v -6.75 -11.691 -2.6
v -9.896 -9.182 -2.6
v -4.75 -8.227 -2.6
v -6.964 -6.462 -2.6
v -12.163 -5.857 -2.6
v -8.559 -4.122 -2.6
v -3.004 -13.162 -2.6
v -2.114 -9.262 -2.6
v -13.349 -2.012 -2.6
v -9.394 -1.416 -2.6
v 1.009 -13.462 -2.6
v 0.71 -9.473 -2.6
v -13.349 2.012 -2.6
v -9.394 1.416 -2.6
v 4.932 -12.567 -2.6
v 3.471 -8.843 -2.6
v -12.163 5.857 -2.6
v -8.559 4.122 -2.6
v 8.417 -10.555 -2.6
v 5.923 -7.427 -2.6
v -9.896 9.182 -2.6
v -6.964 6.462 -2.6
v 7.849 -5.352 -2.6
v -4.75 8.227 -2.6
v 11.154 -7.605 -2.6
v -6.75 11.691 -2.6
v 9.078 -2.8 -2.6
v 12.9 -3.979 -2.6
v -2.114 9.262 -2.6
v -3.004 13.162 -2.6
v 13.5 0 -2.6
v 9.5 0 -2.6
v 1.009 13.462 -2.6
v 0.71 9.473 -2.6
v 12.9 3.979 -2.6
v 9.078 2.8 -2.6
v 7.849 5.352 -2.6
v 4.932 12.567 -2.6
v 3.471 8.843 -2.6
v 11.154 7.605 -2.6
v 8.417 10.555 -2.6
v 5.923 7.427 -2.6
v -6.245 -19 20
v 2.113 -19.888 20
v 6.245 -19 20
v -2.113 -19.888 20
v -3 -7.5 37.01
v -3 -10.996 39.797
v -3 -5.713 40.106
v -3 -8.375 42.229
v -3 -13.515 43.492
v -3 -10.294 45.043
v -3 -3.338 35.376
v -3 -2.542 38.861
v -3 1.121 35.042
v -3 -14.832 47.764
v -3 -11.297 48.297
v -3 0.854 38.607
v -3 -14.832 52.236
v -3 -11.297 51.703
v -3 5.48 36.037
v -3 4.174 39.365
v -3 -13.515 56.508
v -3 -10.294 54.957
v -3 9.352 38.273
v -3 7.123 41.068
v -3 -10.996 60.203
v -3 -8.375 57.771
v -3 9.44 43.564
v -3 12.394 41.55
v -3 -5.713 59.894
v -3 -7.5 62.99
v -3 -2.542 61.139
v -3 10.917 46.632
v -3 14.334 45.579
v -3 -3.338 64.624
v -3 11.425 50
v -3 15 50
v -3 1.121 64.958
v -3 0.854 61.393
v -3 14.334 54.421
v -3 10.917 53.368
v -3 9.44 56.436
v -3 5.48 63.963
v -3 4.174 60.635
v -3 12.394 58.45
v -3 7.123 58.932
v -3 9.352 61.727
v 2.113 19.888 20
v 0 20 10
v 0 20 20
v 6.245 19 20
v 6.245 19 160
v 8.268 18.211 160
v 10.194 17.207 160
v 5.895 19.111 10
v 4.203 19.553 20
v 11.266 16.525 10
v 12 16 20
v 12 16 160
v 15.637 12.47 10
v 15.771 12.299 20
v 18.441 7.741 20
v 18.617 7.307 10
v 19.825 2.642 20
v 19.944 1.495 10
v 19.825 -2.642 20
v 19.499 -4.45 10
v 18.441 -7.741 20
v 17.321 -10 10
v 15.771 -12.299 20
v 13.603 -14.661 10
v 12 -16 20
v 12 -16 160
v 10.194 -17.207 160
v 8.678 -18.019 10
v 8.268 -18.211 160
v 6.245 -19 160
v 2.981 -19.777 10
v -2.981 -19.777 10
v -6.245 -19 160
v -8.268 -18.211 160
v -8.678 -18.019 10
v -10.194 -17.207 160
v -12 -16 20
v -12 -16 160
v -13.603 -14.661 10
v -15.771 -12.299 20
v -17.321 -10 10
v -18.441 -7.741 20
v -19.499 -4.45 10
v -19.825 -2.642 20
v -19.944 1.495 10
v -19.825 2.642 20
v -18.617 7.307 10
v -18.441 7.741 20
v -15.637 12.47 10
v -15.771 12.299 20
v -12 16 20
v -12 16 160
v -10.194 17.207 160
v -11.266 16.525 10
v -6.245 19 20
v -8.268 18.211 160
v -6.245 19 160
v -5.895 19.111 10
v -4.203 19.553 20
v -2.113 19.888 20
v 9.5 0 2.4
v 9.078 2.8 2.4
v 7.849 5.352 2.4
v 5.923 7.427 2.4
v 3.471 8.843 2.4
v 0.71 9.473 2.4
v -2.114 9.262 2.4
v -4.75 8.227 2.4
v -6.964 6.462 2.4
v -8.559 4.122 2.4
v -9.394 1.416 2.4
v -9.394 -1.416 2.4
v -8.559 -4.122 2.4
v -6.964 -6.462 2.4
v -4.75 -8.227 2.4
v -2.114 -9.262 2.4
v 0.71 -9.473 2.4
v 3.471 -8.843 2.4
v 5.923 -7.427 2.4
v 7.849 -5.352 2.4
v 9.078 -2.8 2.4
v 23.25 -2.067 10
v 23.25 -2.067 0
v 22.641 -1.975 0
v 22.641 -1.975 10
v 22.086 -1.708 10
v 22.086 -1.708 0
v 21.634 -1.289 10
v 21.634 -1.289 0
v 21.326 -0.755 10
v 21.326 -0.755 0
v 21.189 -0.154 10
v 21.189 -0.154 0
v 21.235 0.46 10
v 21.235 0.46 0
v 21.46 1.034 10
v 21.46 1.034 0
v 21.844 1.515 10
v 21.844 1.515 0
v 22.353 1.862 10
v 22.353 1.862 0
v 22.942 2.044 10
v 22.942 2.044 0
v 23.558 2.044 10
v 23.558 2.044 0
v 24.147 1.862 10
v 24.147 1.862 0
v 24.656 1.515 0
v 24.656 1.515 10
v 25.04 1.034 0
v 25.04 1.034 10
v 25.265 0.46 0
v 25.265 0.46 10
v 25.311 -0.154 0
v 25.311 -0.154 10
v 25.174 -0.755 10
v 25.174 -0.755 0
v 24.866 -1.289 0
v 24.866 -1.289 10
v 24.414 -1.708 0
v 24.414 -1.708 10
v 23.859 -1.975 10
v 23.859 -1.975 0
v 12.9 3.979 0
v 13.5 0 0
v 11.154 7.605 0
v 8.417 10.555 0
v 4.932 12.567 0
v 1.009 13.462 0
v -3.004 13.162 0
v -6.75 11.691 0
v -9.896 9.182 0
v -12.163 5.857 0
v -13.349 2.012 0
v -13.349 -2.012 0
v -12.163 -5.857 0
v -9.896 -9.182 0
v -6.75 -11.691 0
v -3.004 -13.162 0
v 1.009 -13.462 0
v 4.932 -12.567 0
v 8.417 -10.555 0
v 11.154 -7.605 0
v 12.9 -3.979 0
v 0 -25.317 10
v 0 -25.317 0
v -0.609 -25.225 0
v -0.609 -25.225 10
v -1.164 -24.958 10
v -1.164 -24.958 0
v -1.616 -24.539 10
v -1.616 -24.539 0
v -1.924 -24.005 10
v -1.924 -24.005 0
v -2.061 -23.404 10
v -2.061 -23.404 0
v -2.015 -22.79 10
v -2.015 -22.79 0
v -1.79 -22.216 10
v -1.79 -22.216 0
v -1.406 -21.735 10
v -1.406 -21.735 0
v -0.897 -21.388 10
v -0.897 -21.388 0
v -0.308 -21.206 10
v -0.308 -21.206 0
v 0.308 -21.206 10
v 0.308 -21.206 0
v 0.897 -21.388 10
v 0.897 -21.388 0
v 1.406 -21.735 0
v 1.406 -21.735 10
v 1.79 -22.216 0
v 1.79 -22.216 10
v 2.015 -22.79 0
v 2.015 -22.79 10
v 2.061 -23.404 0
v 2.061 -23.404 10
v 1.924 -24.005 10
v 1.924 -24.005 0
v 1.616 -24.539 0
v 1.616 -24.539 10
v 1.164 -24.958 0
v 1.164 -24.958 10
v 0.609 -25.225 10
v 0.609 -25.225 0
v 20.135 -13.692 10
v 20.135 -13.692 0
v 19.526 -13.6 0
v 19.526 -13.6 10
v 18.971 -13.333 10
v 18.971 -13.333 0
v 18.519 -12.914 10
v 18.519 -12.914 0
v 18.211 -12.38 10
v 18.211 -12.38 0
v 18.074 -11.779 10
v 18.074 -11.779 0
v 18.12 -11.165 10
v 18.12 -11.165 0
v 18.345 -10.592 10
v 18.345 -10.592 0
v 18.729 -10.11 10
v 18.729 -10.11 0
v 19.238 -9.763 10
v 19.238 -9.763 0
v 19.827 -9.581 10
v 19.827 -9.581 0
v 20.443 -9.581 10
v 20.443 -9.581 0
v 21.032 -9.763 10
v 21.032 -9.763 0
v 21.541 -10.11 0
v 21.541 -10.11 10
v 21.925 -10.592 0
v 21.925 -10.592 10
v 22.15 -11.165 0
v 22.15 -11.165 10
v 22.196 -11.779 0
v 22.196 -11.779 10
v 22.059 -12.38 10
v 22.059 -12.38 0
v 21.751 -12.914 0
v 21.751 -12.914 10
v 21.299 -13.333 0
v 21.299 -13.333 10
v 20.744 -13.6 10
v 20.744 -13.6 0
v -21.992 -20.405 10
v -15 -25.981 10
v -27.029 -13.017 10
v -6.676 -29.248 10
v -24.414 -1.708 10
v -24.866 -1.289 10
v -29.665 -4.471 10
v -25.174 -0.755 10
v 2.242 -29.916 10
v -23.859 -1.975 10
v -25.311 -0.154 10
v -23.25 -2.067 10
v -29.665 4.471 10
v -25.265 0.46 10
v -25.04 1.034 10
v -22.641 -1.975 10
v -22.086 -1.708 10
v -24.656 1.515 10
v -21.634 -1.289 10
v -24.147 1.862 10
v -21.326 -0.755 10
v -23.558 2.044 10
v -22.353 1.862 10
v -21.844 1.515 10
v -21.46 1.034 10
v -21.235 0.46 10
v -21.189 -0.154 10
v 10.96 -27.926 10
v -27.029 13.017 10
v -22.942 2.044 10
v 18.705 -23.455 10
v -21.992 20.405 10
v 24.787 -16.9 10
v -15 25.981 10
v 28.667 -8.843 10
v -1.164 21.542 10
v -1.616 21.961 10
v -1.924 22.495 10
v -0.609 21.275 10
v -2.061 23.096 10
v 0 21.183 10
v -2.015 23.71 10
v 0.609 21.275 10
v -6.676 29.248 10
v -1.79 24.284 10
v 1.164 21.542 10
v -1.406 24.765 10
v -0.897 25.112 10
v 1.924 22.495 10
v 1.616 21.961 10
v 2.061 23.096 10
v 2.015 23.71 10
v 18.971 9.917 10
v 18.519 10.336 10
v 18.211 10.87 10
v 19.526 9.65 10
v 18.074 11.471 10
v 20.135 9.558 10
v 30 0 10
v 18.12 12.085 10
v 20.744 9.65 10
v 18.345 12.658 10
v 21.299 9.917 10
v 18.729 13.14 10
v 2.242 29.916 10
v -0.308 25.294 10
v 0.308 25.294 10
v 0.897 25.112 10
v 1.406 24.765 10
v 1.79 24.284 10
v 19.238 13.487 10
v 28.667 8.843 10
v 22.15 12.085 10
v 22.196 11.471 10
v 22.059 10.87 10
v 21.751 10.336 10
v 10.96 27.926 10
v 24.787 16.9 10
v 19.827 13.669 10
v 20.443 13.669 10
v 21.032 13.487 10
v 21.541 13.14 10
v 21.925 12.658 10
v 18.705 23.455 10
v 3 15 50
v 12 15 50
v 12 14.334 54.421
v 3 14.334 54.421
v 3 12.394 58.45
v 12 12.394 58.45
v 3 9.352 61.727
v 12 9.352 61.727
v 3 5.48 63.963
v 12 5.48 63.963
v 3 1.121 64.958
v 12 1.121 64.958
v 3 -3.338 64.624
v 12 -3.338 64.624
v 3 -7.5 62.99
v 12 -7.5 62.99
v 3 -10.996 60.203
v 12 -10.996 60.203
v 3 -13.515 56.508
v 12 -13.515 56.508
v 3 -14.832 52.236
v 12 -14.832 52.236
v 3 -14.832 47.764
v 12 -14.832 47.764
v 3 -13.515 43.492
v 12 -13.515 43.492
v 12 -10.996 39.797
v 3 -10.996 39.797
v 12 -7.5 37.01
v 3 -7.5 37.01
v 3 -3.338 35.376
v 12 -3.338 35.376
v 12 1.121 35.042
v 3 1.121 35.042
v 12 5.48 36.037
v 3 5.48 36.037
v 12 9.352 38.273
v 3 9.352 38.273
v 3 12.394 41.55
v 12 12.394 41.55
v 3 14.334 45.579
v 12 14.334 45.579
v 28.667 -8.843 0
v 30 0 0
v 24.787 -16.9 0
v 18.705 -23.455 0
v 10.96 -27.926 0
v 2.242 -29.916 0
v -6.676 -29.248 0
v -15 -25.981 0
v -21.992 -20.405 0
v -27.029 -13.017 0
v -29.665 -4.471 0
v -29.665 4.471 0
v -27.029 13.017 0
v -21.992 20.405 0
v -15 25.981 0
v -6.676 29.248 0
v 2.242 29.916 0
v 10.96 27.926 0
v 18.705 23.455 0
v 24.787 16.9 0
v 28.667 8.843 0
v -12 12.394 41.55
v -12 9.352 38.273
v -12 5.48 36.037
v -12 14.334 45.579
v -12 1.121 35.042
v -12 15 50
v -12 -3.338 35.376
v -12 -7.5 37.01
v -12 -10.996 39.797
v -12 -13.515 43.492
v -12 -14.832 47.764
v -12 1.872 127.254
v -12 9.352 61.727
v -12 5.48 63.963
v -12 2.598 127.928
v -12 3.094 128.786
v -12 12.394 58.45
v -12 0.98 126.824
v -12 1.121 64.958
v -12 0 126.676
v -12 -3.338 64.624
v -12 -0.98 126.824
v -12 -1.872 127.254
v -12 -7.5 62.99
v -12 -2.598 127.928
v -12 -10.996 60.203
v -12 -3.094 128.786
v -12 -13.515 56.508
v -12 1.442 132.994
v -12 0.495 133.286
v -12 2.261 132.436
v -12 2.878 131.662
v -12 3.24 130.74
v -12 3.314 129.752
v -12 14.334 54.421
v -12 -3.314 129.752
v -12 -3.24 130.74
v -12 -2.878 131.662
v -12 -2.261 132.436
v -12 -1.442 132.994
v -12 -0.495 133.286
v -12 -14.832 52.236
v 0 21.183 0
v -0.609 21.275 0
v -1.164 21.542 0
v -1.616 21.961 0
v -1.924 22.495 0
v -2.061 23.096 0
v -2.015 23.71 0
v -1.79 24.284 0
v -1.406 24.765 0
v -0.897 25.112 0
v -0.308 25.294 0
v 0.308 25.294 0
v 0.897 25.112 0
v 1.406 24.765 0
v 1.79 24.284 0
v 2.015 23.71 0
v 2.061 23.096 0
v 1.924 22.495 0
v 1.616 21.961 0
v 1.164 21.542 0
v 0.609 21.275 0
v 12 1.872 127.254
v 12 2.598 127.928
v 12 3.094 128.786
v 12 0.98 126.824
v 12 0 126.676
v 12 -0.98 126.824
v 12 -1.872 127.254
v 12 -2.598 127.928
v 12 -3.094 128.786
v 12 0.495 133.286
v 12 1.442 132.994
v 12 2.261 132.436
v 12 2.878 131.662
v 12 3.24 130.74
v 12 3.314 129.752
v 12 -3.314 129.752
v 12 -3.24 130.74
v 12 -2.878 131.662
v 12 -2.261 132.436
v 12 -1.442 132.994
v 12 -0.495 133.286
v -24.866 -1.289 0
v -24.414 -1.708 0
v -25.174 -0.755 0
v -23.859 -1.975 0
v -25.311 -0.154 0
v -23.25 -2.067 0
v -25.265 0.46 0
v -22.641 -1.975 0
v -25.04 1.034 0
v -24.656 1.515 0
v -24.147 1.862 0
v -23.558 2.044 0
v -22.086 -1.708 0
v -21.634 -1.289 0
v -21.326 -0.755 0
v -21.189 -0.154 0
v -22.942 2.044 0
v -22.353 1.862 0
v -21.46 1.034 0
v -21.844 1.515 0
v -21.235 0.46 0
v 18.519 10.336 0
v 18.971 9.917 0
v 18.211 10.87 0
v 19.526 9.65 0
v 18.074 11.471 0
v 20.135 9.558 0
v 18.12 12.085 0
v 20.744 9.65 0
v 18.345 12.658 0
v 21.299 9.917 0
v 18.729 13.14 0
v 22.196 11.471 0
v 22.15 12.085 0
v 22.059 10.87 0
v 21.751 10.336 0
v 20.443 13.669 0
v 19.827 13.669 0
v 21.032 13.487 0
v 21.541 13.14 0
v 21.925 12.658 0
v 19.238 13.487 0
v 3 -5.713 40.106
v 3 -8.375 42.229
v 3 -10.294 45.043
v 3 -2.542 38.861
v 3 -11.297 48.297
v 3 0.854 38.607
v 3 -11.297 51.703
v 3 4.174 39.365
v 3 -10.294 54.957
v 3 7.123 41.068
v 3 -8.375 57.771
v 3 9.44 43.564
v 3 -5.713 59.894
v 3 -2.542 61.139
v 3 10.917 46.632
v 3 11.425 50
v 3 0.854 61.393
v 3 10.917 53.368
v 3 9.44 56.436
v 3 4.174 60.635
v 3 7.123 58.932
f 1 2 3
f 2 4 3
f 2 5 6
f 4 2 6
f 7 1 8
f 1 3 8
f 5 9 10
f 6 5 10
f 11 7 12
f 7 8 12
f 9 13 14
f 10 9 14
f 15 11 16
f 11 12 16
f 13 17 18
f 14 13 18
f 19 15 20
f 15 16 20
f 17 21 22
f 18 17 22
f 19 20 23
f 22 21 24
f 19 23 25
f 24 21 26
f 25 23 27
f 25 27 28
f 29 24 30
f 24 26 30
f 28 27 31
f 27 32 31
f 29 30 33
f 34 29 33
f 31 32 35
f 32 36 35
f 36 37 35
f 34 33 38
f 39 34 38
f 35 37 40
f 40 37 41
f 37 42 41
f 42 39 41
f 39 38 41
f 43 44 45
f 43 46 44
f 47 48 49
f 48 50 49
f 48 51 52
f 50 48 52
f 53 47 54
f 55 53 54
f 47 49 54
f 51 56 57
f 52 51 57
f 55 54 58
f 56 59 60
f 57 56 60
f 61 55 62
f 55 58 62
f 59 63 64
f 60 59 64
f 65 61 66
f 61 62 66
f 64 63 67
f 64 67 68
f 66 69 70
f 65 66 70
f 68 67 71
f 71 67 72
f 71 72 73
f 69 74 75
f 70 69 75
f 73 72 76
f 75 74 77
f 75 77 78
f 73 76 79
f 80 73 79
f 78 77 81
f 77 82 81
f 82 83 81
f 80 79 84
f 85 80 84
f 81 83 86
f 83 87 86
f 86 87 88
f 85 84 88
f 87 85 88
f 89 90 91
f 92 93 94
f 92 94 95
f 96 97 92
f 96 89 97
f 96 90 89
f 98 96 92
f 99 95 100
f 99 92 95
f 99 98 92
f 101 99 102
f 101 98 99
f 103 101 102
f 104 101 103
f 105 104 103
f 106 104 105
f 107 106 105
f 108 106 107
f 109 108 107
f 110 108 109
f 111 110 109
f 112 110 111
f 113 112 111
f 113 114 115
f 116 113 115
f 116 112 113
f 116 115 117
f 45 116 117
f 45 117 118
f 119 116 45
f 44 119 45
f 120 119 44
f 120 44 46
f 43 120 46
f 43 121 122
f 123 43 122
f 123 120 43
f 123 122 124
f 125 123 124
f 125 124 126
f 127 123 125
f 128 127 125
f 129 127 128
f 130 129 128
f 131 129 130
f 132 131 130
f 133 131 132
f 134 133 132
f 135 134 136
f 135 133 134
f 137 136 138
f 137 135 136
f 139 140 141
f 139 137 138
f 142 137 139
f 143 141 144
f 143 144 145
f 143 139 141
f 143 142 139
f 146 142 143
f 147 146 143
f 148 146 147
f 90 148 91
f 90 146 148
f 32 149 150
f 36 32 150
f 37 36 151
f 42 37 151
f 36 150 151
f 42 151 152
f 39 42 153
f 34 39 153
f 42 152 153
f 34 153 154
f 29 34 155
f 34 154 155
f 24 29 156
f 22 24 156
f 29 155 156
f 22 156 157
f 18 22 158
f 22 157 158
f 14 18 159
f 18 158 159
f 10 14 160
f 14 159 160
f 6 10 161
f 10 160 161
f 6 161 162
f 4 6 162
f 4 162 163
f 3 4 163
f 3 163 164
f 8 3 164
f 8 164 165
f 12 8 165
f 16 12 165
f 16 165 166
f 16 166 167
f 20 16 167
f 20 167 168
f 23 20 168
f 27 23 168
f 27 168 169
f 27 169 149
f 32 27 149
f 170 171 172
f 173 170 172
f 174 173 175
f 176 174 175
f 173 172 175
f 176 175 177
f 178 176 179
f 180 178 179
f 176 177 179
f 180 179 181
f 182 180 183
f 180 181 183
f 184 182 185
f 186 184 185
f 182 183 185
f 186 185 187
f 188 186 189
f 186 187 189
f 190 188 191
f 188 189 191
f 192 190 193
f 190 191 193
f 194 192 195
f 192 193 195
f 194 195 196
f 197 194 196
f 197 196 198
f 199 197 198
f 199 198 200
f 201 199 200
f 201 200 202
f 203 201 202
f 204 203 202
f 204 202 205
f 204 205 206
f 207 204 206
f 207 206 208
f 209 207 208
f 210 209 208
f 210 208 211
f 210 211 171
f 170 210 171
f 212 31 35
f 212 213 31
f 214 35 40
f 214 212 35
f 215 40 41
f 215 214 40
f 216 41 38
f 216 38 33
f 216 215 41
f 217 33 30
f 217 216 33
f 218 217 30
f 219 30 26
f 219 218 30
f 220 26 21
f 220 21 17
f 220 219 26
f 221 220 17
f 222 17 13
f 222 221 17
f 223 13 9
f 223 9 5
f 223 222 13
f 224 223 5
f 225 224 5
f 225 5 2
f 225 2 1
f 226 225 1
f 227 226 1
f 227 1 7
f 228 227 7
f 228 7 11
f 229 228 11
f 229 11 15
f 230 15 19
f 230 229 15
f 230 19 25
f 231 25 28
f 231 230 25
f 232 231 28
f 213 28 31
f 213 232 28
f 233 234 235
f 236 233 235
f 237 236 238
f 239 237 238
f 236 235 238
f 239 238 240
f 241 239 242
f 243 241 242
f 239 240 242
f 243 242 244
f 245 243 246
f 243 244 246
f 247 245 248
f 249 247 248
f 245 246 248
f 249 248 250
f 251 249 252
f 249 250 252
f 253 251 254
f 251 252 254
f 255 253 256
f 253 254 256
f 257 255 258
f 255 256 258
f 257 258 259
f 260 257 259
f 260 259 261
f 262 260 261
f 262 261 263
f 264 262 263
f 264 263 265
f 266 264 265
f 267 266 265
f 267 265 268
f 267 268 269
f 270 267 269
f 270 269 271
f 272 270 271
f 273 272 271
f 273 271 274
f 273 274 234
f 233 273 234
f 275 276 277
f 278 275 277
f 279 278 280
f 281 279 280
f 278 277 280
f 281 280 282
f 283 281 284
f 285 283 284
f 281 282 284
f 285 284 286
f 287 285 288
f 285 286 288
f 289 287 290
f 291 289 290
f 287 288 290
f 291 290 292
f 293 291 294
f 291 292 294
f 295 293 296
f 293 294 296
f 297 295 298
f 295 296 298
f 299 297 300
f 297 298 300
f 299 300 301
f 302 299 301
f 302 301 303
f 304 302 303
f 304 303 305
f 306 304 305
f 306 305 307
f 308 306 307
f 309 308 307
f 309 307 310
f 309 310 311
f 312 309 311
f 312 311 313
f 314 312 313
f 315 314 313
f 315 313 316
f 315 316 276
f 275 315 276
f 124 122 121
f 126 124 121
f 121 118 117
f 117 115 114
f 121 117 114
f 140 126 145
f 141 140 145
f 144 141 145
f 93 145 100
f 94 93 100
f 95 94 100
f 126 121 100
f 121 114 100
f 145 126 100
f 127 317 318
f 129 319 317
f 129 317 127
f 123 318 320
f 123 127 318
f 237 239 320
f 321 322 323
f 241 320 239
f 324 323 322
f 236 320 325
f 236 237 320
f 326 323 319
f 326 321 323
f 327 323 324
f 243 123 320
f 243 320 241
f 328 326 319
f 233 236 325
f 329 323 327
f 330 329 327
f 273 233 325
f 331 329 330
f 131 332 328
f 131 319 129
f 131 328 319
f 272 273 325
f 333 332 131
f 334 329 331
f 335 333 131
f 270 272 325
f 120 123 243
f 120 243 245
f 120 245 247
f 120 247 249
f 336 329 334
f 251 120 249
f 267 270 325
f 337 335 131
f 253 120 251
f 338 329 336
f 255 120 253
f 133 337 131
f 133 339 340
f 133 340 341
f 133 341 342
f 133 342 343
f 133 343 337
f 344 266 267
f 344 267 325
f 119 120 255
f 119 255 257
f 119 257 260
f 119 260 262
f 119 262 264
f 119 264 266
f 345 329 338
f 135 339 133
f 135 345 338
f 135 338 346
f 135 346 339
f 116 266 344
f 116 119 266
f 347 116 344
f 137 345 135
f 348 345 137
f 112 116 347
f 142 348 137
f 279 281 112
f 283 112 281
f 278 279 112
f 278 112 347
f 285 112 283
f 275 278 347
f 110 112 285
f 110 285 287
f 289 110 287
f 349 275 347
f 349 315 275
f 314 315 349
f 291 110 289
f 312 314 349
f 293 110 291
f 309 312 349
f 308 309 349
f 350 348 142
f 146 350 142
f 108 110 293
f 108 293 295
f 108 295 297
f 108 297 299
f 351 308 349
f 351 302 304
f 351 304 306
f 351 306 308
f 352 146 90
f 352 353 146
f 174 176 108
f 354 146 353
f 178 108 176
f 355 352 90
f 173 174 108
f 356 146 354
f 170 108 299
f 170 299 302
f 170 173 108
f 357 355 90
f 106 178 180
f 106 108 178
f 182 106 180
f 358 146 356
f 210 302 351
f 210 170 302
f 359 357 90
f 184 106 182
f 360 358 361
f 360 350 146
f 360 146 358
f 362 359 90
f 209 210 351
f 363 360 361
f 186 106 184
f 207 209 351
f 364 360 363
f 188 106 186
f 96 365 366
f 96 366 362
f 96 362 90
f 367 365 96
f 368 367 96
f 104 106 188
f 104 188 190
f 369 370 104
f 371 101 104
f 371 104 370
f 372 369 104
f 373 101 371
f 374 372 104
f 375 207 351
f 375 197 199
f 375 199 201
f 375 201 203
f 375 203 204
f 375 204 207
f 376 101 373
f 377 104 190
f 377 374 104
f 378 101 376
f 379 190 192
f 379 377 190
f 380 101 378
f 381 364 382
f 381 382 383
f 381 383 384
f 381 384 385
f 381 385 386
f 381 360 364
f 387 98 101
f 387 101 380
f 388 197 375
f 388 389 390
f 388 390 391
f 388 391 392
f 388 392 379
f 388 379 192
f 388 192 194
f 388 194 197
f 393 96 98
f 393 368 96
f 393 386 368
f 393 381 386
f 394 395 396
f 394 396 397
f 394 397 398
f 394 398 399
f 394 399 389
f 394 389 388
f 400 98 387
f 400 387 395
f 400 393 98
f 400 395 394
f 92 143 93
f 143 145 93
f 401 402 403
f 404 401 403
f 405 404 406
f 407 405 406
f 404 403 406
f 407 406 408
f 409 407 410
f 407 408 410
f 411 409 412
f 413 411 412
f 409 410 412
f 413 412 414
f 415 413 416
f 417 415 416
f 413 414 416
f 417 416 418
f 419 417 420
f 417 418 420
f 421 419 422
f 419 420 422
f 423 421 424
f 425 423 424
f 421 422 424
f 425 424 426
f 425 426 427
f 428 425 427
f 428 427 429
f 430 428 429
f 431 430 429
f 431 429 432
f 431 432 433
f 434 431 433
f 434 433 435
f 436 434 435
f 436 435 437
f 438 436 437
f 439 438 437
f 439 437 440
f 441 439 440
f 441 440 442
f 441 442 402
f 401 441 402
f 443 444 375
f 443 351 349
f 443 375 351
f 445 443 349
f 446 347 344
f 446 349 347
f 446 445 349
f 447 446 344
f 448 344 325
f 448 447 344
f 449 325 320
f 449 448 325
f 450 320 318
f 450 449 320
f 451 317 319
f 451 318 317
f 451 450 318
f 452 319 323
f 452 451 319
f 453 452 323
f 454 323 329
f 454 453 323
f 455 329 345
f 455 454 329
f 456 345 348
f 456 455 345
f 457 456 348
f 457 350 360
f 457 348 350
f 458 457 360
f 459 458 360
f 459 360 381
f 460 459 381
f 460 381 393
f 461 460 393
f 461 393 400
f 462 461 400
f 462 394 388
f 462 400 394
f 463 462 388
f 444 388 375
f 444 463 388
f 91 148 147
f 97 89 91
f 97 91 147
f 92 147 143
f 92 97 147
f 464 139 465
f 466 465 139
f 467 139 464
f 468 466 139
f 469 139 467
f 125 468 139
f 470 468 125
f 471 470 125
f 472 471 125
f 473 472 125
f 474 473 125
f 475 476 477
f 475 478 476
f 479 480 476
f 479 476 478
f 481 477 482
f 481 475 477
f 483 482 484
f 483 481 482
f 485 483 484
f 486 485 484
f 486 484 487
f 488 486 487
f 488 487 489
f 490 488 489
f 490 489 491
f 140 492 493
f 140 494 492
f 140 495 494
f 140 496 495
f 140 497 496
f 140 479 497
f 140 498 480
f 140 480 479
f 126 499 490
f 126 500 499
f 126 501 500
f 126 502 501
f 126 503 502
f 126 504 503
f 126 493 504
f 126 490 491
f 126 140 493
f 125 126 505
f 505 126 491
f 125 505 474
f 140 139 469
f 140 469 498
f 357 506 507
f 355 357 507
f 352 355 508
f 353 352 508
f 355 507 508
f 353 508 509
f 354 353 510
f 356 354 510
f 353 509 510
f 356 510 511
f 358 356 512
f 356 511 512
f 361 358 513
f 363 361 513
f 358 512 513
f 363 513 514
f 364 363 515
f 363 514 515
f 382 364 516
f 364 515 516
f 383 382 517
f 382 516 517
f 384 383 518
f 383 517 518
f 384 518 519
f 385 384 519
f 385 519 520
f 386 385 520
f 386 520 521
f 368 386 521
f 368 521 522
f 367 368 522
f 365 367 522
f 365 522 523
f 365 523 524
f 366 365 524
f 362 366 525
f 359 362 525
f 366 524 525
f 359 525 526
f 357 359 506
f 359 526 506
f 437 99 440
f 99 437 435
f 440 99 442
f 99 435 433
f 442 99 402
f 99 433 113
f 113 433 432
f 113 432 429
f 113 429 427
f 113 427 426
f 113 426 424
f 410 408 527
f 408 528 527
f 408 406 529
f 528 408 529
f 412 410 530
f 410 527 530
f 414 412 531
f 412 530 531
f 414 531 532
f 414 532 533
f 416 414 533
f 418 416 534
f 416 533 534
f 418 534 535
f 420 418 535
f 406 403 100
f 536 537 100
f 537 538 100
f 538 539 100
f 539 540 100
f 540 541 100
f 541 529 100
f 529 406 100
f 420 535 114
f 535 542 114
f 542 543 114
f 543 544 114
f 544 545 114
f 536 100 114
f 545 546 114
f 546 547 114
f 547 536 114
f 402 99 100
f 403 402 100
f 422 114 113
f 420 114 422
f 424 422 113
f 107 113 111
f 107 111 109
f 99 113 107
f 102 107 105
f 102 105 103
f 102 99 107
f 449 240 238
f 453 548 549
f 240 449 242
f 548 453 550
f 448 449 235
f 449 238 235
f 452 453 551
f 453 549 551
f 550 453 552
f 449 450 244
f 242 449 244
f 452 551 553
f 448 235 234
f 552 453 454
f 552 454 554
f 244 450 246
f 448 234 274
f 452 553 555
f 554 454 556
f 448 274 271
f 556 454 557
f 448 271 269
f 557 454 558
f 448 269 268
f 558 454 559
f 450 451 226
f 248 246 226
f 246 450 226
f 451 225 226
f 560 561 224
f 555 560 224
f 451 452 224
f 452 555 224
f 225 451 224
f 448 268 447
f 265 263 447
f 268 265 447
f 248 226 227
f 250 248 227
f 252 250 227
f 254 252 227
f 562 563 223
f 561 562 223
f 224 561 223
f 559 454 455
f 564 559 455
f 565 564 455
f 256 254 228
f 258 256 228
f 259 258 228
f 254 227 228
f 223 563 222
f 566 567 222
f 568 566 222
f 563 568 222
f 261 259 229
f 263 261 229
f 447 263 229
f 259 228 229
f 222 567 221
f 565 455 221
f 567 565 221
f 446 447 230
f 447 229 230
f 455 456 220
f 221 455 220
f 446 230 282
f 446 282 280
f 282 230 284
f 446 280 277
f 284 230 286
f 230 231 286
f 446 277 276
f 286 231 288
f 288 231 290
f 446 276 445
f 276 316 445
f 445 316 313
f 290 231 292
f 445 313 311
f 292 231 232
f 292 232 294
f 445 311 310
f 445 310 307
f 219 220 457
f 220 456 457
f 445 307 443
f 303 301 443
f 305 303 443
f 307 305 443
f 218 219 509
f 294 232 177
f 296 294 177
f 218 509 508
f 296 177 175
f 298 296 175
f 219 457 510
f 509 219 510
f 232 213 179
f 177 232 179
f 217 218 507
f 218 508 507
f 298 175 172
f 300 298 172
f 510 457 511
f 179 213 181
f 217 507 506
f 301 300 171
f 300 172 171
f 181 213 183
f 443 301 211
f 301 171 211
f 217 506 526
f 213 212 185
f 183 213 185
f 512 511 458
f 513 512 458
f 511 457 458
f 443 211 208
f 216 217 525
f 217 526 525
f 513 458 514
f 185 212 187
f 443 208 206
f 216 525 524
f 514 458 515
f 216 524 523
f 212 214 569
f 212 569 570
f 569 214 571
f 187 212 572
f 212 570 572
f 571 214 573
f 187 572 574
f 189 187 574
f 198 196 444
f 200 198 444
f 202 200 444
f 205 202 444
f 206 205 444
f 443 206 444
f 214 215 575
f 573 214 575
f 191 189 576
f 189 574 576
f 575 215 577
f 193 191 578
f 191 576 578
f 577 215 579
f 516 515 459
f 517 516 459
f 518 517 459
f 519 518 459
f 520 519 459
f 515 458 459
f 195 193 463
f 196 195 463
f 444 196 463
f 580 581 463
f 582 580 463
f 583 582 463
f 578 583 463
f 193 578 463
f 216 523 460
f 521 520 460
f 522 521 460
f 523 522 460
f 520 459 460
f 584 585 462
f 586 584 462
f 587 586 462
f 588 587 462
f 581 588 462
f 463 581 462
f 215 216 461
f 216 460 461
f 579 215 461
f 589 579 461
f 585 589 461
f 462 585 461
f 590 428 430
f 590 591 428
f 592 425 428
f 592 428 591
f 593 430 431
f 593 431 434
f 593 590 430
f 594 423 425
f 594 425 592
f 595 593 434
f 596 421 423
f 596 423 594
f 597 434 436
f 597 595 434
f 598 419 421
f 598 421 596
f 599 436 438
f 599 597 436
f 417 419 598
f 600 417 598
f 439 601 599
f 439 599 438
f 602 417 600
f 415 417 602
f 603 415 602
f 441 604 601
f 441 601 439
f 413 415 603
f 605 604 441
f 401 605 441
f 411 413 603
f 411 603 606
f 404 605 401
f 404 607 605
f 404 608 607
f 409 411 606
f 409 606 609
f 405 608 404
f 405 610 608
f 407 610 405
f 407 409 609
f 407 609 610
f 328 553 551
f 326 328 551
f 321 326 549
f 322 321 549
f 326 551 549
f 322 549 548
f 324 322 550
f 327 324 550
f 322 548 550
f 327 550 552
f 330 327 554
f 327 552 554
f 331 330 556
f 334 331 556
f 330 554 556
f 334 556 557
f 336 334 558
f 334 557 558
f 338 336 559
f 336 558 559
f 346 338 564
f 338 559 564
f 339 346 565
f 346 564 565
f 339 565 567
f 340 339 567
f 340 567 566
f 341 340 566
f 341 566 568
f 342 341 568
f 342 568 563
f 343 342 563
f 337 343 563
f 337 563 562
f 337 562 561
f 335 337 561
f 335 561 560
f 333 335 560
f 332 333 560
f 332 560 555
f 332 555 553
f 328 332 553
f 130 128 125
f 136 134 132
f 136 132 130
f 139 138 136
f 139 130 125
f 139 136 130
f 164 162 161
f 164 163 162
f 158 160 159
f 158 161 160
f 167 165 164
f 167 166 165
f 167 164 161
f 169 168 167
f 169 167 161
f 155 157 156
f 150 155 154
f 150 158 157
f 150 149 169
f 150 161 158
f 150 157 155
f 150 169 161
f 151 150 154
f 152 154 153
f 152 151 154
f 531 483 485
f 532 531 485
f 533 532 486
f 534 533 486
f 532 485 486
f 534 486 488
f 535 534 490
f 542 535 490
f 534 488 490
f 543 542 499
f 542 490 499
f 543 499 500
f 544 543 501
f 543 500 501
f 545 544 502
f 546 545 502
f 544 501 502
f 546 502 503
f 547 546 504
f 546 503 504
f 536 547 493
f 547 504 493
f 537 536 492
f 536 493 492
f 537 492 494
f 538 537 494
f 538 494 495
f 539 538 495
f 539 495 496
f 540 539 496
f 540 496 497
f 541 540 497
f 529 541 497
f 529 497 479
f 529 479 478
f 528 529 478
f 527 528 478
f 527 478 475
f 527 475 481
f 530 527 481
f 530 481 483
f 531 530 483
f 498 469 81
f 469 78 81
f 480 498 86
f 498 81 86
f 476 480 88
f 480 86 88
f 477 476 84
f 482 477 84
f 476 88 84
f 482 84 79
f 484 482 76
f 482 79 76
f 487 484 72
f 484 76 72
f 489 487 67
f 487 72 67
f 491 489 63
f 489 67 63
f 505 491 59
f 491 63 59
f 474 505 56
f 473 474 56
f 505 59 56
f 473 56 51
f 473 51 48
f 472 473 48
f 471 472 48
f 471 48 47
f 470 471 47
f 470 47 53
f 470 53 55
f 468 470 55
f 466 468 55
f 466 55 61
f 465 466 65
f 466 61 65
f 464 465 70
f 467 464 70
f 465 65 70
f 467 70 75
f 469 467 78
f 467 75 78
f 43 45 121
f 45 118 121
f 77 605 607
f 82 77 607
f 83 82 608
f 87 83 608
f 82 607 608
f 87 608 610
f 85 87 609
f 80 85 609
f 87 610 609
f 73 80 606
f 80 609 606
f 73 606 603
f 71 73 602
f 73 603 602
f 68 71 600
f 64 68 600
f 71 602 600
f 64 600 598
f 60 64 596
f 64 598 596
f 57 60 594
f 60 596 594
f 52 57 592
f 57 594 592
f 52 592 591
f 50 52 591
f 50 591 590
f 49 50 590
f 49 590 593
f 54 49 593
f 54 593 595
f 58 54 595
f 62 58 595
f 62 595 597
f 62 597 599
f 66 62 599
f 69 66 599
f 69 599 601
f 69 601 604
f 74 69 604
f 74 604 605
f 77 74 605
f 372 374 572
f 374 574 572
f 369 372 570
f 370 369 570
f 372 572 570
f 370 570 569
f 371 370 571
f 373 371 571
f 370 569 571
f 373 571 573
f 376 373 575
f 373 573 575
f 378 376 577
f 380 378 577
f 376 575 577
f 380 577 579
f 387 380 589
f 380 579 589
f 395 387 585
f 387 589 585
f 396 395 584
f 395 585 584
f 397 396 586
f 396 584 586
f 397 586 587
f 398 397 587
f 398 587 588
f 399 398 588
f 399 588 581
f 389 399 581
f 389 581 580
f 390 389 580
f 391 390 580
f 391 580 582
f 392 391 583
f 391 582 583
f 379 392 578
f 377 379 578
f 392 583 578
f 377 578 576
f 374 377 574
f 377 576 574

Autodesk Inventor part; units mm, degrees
sketch "Skizze1" plane through (0, 0, 0) normal (0, 0, 1) x (1, 0, 0)
  circle A0 centre (0, 0) radius 30
  circle A1 centre (0, 0) radius 13.5
  circle A2 centre (0, 0) radius 9.5
  circle A3 centre (0, 0) radius 23.25 construction
  line L0 (0, 0) -> (0, 23.25) construction
  point P0 (-23.25, 0)
  point P1 (0, -23.25)
  point P2 (23.25, 0)
  dimension "d4" = 46.5
  dimension "d0" = 4
  dimension "d1" = 27
  dimension "d3" = 30
  dimension "d7" = 360
extrude "Extrusion1" add sketch "Skizze1" along normal blind 10 contours A0 | A1
extrude "Extrusion2" add sketch "Skizze1" against normal blind 2.6 contours A1
sketch "Skizze2" plane through (0, 0, 10) normal (0, 0, 1) x (1, 0, 0)
  point P0 (0, 0)
  point P1 (0, 23.25)
  point P2 (20.1351, 11.625)
  point P3 (20.1351, -11.625)
  point P4 (23.25, 0)
  point P5 (0, -23.25)
  point P6 (-23.25, 0)
hole "Bohrung1" at (0, 23.25, 10) at (20.1351, 11.625, 10) at (20.1351, -11.625, 10) at (23.25, 0, 10) at (0, -23.25, 10) at (-23.25, 0, 10) direction (0, 0, -1) diameter 4.134 end through all thread size "M5x0.8" class "6H" standard "ISO Metric profile"
ref_plane "Arbeitsebene1" through (0, 0, 10) normal (0, 0, 1) x (1, 0, 0)
sketch "Skizze4" plane through (0, 0, 0) normal (1, 0, 0) x (0, 1, 0)
  line L0 (9.5, -2.6) -> (-9.5, -2.6) construction
  line L1 (0, 192.52) -> (0, -35.12) construction
  line L2 (-9.5, 10) -> (-9.5, -2.6) construction
  line L3 (9.5, 10) -> (9.5, -2.6) construction
  line L4 (-9.5, 10) -> (9.5, 10) construction
  line L5 (-9.5, 2.4) -> (9.5, 2.4)
  line L6 (-9.5, 2.4) -> (-9.5, 10)
  line L7 (-9.5, 10) -> (-20, 10)
  line L8 (-20, 10) -> (-20, 160)
  line L9 (-20, 160) -> (20, 160)
  line L10 (20, 10) -> (9.5, 10)
  line L11 (9.5, 10) -> (9.5, 2.4)
  line L12 (20, 160) -> (20, 10)
  line L13 (0, 2.4) -> (0, 160)
  point P0 (0, 0)
  dimension "d27" = 5
  dimension "d31" = 150
  dimension "d33" = 40
revolve "Umdrehung1" add sketch "Skizze4" angle 360 about axis through (0, 0, 0) along (0, 0, -1) contours L13 L9 L12 L10 L11 L5
sketch "Skizze5" plane through (0, 0, 160) normal (0, 0, 1) x (1, 0, 0)
  circle A0 centre (0, 0) radius 20
  line L0 (-12, 16) -> (-12, -16)
  line L1 (12, 16) -> (12, -16)
  line L2 (-6.245, 19) -> (6.245, 19)
  circle A1 centre (0, 0) radius 20 construction
  dimension "MainAxis_Schluesselweite" = 24
  dimension "d46" = 1
  dimension "d52" = 32
extrude "Extrusion3" cut sketch "Skizze5" against normal blind 140 contours A0 L1 | A0 L0
sketch "Skizze6" plane through (0, 0, 0) normal (1, 0, 0) x (0, 1, 0)
  line L0 (-16, 160) -> (16, 160) construction
  line L1 (-16, 20) -> (16, 20) construction
  line L2 (0, -32) -> (0, 192) construction
  line L3 (-16, 20) -> (-16, 160) projected
  line L4 (16, 160) -> (16, 20) projected
  point P0 (0, 0)
  dimension "Flansch_ParralelMech_FlatPart_Width" = 140
ref_plane "Arbeitsebene2" through (0, 0, 90) normal (0, 0, 1) x (1, 0, 0)
ref_plane "Arbeitsebene3" through (0, 0, 50) normal (0, 0, 1) x (1, 0, 0)
ref_plane "Arbeitsebene4" through (0, 0, 130) normal (0, 0, 1) x (1, 0, 0)
extrude "Extrusion4" cut sketch "Skizze5" against normal blind 140 contours L2 A0
sketch "Skizze7" plane through (0, 0, 50) normal (0, 0, 1) x (1, 0, 0)
  line L0 (-12, 16) -> (-12, -16) construction
  line L1 (-12, 15) -> (-3, 15)
  line L2 (-3, 15) -> (-3, 11.425)
  line L3 (-3, 11.425) -> (3, 11.425)
  line L4 (3, 11.425) -> (3, 15)
  line L5 (3, 15) -> (12, 15)
  line L6 (-12, 0) -> (-12, 15)
  line L7 (0, -16) -> (0, 16) construction
  line L8 (12, -16) -> (12, 16) construction
  line L9 (12, 15) -> (12, 0)
  line L10 (-12, 0) -> (12, 0)
  line L11 (-42, 0) -> (42, 0) construction
  point P0 (0, 11.425)
  point P1 (-12, -7.2111)
  point P2 (12, 7.2111)
  dimension "d51" = 9
  dimension "d63" = 30
  dimension "d64" = 22.85
revolve "Umdrehung2" cut sketch "Skizze7" angle 360 about axis through (-10, 0, 50) along (1, 0, 0)
ref_plane "Arbeitsebene5" through (0, 0, 85) normal (1, 0, 0) x (0, 0, -1)
sketch "Skizze8" plane through (12, -16, 160) normal (1, 0, 0) x (0, 0, -1)
  line L0 (30, -26) -> (30, 58) construction
  line L1 (-32.52, 16) -> (195.12, 16) construction
  point P0 (160, 16)
  point P1 (30, 16)
hole "Bohrung2" at (12, 0, 130) direction (-1, 0, 0) diameter 6.647 end through all thread size "M8x1.25" class "6H" standard "ISO Metric profile"
mirror "Spiegeln2" about plane through (0, 0, 0) normal (0, 1, 0) of "Extrusion4"
equation "\"d4\" = Flansch_FemalePart_HoleDia"
equation "\"d1\" = Flansch_Klemmdeckelausnahme_Dia"
equation "\"d3\" = Flansch_FemalePart_OuterDia"
equation "\"d47\" = Flansch_ParralelMech_FlatPart_Width"
equation "\"d33\" = d28"
equation "\"Total_Bearing_Hole_Dist\" = 80"
equation "\"Flansch_FemalePart_HoleDia\" = 46.5"
equation "\"Flansch_Klemmdeckelausnahme_Dia\" = 27"
equation "\"Flansch_FemalePart_OuterDia\" = 30"
equation "\"d28\" = 40"
properties part number "Flansch_FemalePart_MainAxis_HeadConnectorBase" material "Edelstahl"
